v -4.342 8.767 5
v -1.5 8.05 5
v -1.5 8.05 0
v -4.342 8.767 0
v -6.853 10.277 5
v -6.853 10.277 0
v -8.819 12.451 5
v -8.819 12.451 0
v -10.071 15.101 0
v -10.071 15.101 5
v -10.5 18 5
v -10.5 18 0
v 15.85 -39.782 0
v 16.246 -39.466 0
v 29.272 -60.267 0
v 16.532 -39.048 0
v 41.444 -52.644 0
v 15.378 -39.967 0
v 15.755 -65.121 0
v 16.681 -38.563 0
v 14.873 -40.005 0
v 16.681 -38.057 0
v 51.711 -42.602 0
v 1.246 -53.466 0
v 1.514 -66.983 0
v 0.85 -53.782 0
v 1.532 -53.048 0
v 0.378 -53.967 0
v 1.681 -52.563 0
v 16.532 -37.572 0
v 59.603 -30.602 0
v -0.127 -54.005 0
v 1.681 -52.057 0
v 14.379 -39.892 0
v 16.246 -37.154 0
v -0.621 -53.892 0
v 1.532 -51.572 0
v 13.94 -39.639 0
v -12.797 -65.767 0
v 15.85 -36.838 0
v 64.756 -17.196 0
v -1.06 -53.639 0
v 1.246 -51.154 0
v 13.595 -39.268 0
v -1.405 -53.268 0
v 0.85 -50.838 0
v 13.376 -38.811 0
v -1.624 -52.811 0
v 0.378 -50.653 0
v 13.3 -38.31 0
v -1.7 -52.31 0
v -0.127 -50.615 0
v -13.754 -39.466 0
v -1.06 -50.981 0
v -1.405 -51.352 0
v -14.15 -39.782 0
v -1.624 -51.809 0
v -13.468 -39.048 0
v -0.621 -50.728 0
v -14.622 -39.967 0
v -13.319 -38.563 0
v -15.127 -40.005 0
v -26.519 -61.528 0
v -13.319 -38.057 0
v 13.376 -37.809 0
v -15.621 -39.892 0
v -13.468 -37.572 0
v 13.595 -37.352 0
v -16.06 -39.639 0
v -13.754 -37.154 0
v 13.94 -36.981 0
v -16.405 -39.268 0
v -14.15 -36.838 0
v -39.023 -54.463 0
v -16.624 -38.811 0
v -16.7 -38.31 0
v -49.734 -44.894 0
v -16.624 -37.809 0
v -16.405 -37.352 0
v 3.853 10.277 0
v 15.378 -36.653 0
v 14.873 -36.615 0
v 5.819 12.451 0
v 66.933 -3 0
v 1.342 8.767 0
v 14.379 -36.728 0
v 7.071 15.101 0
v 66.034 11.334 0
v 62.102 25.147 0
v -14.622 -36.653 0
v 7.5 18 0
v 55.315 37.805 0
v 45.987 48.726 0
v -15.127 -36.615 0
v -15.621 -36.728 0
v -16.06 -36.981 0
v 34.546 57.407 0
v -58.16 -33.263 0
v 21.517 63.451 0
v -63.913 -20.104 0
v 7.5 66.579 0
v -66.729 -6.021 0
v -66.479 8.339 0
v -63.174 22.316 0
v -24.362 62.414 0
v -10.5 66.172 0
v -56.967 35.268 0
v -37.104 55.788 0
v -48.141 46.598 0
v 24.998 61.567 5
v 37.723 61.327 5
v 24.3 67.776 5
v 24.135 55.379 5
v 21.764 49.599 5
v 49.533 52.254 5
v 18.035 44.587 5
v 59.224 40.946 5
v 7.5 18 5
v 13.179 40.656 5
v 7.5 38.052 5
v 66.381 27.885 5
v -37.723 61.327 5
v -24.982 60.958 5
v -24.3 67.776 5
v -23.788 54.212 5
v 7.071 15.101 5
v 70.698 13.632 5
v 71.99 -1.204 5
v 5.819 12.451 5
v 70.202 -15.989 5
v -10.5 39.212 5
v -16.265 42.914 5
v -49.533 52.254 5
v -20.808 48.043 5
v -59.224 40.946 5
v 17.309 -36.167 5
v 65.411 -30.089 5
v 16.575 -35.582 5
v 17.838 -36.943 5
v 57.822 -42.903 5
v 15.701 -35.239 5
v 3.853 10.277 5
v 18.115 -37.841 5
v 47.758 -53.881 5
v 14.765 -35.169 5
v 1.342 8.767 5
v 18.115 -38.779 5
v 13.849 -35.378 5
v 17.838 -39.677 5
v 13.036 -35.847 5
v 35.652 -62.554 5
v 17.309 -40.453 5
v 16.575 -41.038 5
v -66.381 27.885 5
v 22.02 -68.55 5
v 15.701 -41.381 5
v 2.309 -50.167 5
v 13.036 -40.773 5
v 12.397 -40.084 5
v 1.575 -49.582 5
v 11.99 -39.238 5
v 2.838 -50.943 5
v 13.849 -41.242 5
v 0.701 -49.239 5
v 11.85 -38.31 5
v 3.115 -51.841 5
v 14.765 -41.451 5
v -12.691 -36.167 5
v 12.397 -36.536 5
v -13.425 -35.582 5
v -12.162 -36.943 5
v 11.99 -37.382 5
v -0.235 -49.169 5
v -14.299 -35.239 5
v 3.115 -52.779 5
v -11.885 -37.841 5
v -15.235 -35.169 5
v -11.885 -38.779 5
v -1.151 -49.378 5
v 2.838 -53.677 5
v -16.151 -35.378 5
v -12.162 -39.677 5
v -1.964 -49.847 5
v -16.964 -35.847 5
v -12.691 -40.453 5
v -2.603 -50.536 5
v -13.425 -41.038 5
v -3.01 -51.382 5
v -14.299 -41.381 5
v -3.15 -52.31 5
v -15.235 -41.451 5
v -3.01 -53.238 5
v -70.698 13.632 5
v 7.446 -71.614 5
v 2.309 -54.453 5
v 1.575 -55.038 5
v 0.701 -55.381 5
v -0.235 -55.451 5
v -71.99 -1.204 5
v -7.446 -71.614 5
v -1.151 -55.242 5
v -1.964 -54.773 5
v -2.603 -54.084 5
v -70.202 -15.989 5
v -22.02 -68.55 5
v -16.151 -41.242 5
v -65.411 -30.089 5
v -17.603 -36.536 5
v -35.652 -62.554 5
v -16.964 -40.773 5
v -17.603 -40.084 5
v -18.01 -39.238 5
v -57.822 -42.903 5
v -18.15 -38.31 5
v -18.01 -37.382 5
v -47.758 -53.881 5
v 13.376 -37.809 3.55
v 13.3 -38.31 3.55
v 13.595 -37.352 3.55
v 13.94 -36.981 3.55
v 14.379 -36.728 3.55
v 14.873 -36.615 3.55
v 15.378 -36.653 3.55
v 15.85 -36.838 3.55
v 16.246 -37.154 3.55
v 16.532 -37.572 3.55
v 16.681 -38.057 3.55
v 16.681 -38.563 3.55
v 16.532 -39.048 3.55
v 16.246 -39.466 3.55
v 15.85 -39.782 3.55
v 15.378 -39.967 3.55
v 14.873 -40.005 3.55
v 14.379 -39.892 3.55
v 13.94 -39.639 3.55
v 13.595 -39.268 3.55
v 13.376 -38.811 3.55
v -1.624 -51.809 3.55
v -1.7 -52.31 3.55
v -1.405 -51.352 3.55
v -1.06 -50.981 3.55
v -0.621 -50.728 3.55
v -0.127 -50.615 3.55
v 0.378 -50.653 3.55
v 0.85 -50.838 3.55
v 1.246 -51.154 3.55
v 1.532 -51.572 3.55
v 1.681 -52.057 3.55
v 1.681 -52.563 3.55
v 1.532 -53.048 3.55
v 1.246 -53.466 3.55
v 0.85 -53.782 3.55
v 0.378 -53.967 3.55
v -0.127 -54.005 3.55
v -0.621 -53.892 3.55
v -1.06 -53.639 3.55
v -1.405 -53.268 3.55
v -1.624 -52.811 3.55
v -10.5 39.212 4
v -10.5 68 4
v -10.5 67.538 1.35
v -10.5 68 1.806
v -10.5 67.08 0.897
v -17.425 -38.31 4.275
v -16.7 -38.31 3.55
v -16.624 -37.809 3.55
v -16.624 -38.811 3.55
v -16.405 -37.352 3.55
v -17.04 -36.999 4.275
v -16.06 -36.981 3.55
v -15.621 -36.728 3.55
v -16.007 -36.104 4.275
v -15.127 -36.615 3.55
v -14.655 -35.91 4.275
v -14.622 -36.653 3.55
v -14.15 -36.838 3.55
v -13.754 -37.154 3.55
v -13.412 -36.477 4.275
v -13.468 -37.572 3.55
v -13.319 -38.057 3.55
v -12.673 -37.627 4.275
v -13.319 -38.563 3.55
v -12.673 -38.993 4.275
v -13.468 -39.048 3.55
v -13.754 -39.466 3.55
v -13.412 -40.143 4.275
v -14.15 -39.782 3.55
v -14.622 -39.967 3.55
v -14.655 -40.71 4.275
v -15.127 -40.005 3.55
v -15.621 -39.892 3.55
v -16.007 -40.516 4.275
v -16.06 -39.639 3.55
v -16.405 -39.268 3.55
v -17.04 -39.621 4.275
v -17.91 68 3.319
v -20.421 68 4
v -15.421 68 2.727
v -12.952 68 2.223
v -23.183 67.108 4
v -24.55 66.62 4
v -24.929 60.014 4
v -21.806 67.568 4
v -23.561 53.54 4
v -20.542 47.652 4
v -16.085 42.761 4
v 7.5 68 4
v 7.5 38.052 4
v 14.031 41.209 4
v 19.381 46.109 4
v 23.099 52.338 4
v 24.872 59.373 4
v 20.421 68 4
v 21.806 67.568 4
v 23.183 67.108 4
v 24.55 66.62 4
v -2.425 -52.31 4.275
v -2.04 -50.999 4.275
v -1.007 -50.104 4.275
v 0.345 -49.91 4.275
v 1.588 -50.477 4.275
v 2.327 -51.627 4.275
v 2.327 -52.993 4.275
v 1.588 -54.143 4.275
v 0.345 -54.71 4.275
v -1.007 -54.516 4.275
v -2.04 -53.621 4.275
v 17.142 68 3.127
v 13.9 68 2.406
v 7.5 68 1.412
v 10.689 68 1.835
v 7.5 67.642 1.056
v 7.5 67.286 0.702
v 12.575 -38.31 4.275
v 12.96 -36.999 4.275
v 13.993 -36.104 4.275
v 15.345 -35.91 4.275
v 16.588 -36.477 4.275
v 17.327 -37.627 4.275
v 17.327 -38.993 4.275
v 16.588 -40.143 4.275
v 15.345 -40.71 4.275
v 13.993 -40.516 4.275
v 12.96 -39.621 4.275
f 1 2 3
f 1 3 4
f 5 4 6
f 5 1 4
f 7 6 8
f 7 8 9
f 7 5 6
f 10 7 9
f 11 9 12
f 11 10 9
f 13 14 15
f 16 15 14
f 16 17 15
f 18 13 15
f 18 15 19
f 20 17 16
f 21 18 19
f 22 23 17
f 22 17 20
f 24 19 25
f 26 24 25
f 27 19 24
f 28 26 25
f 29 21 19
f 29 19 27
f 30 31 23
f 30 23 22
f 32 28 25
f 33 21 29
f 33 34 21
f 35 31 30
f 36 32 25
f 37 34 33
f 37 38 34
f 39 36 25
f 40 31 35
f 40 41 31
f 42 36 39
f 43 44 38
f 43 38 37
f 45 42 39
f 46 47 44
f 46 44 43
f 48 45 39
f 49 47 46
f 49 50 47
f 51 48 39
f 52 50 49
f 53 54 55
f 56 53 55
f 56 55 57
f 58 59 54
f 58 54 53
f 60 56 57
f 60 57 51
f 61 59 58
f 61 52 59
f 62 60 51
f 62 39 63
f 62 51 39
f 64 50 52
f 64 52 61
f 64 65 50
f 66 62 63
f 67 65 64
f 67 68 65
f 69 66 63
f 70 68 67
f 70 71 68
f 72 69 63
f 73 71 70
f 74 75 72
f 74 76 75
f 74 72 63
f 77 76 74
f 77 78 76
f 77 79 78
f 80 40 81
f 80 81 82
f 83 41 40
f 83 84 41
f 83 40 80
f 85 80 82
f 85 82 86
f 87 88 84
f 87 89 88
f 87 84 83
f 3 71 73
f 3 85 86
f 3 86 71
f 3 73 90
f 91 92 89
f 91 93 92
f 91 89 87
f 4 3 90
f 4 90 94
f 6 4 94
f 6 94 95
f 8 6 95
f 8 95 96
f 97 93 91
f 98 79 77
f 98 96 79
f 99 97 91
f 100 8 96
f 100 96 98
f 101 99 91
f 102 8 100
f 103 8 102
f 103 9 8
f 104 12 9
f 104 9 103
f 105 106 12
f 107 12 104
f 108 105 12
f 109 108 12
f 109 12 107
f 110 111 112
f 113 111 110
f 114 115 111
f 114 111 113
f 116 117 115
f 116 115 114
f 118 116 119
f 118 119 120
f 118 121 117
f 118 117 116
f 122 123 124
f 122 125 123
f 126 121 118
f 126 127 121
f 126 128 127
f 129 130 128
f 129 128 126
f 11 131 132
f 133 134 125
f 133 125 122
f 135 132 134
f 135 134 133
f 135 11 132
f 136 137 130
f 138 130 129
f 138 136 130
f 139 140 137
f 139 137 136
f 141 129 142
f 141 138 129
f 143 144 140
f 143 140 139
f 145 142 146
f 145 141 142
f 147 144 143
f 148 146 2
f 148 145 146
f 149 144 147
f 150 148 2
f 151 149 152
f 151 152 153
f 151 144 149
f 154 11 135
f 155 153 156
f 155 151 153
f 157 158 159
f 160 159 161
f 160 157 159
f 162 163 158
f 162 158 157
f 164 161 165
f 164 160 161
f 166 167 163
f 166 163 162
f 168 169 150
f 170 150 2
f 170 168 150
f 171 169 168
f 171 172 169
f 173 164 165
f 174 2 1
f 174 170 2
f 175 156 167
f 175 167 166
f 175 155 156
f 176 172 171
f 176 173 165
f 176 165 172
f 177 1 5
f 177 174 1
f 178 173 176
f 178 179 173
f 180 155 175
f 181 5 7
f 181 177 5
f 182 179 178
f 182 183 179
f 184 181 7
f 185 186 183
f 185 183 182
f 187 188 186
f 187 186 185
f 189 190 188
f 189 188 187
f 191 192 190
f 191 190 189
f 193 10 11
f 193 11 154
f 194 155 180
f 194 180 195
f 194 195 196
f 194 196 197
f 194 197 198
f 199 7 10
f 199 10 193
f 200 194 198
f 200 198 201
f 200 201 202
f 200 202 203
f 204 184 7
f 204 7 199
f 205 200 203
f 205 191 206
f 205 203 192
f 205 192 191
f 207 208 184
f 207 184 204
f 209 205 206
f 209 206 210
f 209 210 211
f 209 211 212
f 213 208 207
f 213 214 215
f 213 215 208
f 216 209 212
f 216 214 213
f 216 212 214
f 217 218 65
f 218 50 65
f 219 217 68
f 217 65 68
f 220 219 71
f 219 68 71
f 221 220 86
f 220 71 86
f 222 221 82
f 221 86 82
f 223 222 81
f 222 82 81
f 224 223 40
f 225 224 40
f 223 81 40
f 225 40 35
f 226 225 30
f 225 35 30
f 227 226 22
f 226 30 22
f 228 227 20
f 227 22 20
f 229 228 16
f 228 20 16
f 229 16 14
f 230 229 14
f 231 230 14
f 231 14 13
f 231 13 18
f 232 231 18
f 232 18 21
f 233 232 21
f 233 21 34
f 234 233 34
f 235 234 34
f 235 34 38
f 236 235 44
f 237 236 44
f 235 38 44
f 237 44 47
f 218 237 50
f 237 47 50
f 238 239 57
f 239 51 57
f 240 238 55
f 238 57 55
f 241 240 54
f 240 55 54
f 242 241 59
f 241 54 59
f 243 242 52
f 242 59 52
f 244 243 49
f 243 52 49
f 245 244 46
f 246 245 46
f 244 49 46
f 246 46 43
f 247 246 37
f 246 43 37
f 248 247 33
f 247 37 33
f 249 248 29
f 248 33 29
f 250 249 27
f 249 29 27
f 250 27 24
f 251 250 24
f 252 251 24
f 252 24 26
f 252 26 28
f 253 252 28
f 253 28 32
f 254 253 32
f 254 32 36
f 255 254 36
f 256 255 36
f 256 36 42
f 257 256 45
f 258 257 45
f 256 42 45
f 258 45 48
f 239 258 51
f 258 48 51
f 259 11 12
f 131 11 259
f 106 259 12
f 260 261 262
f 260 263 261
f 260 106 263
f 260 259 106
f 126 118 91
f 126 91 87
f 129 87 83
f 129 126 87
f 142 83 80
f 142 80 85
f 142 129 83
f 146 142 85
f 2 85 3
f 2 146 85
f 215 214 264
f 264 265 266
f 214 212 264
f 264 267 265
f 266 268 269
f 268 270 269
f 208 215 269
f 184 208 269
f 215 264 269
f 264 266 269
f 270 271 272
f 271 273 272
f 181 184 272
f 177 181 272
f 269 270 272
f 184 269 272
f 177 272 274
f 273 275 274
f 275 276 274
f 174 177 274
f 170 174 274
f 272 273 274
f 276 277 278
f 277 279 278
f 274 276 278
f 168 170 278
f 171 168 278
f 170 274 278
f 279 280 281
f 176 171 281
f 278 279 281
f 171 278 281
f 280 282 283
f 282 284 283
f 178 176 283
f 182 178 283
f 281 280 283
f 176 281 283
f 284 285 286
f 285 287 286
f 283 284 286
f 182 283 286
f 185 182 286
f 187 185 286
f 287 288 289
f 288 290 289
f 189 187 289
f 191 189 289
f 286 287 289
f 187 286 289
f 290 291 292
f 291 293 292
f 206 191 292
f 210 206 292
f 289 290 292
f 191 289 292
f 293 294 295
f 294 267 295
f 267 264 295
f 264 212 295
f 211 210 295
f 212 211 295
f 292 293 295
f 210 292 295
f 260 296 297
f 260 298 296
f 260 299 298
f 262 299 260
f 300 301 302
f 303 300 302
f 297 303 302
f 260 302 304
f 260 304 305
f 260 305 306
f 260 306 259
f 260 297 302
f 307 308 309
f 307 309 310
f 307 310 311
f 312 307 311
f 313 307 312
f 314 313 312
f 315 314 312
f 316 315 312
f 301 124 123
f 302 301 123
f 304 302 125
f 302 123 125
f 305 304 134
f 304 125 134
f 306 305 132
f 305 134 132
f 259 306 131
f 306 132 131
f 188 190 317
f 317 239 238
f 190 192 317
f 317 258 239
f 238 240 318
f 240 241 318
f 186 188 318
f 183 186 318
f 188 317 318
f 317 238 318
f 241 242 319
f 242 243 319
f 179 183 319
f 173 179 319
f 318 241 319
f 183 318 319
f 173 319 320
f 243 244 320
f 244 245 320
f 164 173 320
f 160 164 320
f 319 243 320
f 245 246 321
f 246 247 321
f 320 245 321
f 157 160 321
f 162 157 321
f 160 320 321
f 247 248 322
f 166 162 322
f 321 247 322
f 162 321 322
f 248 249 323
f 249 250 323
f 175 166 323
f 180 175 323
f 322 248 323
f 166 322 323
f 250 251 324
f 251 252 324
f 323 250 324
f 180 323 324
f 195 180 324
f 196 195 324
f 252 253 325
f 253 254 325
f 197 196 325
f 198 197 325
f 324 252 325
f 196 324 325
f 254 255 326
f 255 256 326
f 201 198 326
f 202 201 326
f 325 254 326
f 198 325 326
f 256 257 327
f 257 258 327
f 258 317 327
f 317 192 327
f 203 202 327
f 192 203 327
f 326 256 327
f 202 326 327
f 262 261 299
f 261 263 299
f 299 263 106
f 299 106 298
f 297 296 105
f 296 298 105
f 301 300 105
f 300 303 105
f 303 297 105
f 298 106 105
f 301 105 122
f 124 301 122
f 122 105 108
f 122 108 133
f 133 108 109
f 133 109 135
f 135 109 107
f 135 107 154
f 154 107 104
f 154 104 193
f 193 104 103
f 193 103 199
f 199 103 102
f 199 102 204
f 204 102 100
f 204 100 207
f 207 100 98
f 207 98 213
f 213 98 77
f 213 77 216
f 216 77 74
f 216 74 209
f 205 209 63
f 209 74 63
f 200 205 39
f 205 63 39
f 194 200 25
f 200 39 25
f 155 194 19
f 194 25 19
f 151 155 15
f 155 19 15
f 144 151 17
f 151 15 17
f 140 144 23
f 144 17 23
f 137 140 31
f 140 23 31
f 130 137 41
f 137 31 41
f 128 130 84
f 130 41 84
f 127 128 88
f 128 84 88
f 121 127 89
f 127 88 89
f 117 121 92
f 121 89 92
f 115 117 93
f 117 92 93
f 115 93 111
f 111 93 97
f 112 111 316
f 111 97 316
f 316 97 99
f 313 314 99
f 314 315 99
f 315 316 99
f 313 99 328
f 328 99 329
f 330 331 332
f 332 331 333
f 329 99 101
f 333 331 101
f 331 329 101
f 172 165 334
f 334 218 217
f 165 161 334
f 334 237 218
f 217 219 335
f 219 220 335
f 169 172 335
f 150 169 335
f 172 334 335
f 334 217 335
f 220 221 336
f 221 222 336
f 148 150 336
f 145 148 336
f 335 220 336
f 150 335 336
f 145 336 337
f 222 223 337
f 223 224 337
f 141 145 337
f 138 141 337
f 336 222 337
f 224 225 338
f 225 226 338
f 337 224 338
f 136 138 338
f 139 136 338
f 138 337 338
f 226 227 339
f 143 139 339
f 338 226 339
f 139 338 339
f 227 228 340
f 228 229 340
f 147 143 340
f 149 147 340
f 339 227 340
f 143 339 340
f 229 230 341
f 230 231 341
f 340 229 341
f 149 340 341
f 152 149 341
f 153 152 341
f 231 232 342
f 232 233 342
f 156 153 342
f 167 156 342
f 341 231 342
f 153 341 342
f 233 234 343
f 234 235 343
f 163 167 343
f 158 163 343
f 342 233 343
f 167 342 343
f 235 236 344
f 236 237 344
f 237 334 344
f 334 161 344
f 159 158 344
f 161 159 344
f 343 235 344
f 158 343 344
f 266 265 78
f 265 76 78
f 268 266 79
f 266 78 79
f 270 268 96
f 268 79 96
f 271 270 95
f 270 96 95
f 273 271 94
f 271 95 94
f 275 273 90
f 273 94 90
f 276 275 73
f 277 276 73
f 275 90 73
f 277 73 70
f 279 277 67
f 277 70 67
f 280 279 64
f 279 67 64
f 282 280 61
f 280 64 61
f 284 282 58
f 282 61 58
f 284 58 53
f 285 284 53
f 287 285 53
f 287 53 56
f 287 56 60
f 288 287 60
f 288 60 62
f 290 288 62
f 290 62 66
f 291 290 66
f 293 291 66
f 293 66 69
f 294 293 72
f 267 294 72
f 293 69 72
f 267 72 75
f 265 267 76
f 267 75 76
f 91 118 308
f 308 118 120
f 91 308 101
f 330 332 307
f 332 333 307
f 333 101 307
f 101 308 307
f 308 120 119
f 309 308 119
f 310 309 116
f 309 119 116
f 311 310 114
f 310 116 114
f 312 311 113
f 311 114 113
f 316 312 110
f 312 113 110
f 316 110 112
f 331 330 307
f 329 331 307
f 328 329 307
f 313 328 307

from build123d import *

# Parameters (mm, degrees)
BOSS_EXTRUDE2_DEPTH                                 = 5
CSK_FOR_M3_COUNTERSUNK_FLAT_HEAD_SCREW1_D           = 3.4
CSK_FOR_M3_COUNTERSUNK_FLAT_HEAD_SCREW1_DEPTH       = 5
CSK_FOR_M3_COUNTERSUNK_FLAT_HEAD_SCREW1_CSINK_D     = 6.3
CSK_FOR_M3_COUNTERSUNK_FLAT_HEAD_SCREW1_CSINK_ANGLE = 90
CSK_FOR_M3_COUNTERSUNK_FLAT_HEAD_SCREW1_TIP         = 1.021463052
CUT_EXTRUDE1_REACH                                  = 103.946
SKETCH4_W                                           = 18
SKETCH4_H                                           = 60
SKETCH5_R                                           = 25
CUT_EXTRUDE2_DEPTH                                  = 1
FILLET1_R                                           = 10


with BuildPart() as part:
    # Sketch1 → Boss-Extrude2 (new body)
    with BuildSketch(Plane.XY):
        with BuildLine():
            Line((-23.664319132, 68), (23.664319132, 68))
            ThreePointArc((23.664319132, 68), (0, -72), (-23.664319132, 68))
        make_face()
    extrude(amount=BOSS_EXTRUDE2_DEPTH)

    # Chamfer1: read off the stored shape, not the designer's step
    # Chamfer1 outline → Chamfer1 (revolve, cut)
    with BuildSketch(Plane.XZ):
        Polygon((72.000000172, 5.000000172), (67, 0), (72.000000172, 0), align=None)
    revolve(axis=Axis((0, 0, 0), (0, 0, 1)), mode=Mode.SUBTRACT)

    # CSK for M3 Countersunk Flat Head Screw1
    with Locations(Plane.XY.offset(5)):
        with Locations((15, -38.31), (-15, -38.31), (0, -52.31)):
            CounterSinkHole(CSK_FOR_M3_COUNTERSUNK_FLAT_HEAD_SCREW1_D / 2, CSK_FOR_M3_COUNTERSUNK_FLAT_HEAD_SCREW1_CSINK_D / 2, depth=CSK_FOR_M3_COUNTERSUNK_FLAT_HEAD_SCREW1_DEPTH, counter_sink_angle=CSK_FOR_M3_COUNTERSUNK_FLAT_HEAD_SCREW1_CSINK_ANGLE)
            with Locations((0, 0, -(CSK_FOR_M3_COUNTERSUNK_FLAT_HEAD_SCREW1_DEPTH + CSK_FOR_M3_COUNTERSUNK_FLAT_HEAD_SCREW1_TIP / 2))):  # 118° drill point
                Cone(0, CSK_FOR_M3_COUNTERSUNK_FLAT_HEAD_SCREW1_D / 2, CSK_FOR_M3_COUNTERSUNK_FLAT_HEAD_SCREW1_TIP, mode=Mode.SUBTRACT)

    # Cut-Extrude1: up to this face of the body (flat: up to its plane)
    cut_extrude1_end = Plane(part.part.faces().sort_by_distance((0, 0.083165236, 0))[0])
    # Sketch4 → Cut-Extrude1 (cut, up to the picked face)
    with BuildSketch(Plane.XY.offset(5), mode=Mode.PRIVATE) as cut_extrude1_sk1:
        with Locations((-1.5, 38)):
            Rectangle(SKETCH4_W, SKETCH4_H)
    cut_extrude1_tool1 = split(extrude(cut_extrude1_sk1.sketch, amount=-CUT_EXTRUDE1_REACH, mode=Mode.PRIVATE), bisect_by=cut_extrude1_end, keep=Keep.BOTH, mode=Mode.PRIVATE)
    add(cut_extrude1_tool1.solids().sort_by(Axis((-1.5, 38, 5), (0, 0, -1)))[0], mode=Mode.SUBTRACT)

    # Sketch5 → Cut-Extrude2 (cut)
    with BuildSketch(Plane.XY.offset(5)):
        with Locations((0, 61.9)):
            Circle(SKETCH5_R)
    extrude(amount=-CUT_EXTRUDE2_DEPTH, mode=Mode.SUBTRACT)

    # Fillet1
    # the kernel refuses this fillet: 10 mm, written as the material it adds along each edge
    with BuildSketch(Plane(origin=(-10.5, 8, 5), x_dir=(1, 0, 0), z_dir=(0, 0, -1)), Plane(origin=(7.5, 8, 5), x_dir=(0, 1, 0), z_dir=(0, 0, -1))) as fillet1_piece_1:
        with BuildLine():
            CenterArc((FILLET1_R, -FILLET1_R), FILLET1_R, 90, 90)
            Line((0, -FILLET1_R), (0, 0))
            Line((0, 0), (FILLET1_R, 0))
        make_face()
    extrude(amount=5)


solid = part.part
